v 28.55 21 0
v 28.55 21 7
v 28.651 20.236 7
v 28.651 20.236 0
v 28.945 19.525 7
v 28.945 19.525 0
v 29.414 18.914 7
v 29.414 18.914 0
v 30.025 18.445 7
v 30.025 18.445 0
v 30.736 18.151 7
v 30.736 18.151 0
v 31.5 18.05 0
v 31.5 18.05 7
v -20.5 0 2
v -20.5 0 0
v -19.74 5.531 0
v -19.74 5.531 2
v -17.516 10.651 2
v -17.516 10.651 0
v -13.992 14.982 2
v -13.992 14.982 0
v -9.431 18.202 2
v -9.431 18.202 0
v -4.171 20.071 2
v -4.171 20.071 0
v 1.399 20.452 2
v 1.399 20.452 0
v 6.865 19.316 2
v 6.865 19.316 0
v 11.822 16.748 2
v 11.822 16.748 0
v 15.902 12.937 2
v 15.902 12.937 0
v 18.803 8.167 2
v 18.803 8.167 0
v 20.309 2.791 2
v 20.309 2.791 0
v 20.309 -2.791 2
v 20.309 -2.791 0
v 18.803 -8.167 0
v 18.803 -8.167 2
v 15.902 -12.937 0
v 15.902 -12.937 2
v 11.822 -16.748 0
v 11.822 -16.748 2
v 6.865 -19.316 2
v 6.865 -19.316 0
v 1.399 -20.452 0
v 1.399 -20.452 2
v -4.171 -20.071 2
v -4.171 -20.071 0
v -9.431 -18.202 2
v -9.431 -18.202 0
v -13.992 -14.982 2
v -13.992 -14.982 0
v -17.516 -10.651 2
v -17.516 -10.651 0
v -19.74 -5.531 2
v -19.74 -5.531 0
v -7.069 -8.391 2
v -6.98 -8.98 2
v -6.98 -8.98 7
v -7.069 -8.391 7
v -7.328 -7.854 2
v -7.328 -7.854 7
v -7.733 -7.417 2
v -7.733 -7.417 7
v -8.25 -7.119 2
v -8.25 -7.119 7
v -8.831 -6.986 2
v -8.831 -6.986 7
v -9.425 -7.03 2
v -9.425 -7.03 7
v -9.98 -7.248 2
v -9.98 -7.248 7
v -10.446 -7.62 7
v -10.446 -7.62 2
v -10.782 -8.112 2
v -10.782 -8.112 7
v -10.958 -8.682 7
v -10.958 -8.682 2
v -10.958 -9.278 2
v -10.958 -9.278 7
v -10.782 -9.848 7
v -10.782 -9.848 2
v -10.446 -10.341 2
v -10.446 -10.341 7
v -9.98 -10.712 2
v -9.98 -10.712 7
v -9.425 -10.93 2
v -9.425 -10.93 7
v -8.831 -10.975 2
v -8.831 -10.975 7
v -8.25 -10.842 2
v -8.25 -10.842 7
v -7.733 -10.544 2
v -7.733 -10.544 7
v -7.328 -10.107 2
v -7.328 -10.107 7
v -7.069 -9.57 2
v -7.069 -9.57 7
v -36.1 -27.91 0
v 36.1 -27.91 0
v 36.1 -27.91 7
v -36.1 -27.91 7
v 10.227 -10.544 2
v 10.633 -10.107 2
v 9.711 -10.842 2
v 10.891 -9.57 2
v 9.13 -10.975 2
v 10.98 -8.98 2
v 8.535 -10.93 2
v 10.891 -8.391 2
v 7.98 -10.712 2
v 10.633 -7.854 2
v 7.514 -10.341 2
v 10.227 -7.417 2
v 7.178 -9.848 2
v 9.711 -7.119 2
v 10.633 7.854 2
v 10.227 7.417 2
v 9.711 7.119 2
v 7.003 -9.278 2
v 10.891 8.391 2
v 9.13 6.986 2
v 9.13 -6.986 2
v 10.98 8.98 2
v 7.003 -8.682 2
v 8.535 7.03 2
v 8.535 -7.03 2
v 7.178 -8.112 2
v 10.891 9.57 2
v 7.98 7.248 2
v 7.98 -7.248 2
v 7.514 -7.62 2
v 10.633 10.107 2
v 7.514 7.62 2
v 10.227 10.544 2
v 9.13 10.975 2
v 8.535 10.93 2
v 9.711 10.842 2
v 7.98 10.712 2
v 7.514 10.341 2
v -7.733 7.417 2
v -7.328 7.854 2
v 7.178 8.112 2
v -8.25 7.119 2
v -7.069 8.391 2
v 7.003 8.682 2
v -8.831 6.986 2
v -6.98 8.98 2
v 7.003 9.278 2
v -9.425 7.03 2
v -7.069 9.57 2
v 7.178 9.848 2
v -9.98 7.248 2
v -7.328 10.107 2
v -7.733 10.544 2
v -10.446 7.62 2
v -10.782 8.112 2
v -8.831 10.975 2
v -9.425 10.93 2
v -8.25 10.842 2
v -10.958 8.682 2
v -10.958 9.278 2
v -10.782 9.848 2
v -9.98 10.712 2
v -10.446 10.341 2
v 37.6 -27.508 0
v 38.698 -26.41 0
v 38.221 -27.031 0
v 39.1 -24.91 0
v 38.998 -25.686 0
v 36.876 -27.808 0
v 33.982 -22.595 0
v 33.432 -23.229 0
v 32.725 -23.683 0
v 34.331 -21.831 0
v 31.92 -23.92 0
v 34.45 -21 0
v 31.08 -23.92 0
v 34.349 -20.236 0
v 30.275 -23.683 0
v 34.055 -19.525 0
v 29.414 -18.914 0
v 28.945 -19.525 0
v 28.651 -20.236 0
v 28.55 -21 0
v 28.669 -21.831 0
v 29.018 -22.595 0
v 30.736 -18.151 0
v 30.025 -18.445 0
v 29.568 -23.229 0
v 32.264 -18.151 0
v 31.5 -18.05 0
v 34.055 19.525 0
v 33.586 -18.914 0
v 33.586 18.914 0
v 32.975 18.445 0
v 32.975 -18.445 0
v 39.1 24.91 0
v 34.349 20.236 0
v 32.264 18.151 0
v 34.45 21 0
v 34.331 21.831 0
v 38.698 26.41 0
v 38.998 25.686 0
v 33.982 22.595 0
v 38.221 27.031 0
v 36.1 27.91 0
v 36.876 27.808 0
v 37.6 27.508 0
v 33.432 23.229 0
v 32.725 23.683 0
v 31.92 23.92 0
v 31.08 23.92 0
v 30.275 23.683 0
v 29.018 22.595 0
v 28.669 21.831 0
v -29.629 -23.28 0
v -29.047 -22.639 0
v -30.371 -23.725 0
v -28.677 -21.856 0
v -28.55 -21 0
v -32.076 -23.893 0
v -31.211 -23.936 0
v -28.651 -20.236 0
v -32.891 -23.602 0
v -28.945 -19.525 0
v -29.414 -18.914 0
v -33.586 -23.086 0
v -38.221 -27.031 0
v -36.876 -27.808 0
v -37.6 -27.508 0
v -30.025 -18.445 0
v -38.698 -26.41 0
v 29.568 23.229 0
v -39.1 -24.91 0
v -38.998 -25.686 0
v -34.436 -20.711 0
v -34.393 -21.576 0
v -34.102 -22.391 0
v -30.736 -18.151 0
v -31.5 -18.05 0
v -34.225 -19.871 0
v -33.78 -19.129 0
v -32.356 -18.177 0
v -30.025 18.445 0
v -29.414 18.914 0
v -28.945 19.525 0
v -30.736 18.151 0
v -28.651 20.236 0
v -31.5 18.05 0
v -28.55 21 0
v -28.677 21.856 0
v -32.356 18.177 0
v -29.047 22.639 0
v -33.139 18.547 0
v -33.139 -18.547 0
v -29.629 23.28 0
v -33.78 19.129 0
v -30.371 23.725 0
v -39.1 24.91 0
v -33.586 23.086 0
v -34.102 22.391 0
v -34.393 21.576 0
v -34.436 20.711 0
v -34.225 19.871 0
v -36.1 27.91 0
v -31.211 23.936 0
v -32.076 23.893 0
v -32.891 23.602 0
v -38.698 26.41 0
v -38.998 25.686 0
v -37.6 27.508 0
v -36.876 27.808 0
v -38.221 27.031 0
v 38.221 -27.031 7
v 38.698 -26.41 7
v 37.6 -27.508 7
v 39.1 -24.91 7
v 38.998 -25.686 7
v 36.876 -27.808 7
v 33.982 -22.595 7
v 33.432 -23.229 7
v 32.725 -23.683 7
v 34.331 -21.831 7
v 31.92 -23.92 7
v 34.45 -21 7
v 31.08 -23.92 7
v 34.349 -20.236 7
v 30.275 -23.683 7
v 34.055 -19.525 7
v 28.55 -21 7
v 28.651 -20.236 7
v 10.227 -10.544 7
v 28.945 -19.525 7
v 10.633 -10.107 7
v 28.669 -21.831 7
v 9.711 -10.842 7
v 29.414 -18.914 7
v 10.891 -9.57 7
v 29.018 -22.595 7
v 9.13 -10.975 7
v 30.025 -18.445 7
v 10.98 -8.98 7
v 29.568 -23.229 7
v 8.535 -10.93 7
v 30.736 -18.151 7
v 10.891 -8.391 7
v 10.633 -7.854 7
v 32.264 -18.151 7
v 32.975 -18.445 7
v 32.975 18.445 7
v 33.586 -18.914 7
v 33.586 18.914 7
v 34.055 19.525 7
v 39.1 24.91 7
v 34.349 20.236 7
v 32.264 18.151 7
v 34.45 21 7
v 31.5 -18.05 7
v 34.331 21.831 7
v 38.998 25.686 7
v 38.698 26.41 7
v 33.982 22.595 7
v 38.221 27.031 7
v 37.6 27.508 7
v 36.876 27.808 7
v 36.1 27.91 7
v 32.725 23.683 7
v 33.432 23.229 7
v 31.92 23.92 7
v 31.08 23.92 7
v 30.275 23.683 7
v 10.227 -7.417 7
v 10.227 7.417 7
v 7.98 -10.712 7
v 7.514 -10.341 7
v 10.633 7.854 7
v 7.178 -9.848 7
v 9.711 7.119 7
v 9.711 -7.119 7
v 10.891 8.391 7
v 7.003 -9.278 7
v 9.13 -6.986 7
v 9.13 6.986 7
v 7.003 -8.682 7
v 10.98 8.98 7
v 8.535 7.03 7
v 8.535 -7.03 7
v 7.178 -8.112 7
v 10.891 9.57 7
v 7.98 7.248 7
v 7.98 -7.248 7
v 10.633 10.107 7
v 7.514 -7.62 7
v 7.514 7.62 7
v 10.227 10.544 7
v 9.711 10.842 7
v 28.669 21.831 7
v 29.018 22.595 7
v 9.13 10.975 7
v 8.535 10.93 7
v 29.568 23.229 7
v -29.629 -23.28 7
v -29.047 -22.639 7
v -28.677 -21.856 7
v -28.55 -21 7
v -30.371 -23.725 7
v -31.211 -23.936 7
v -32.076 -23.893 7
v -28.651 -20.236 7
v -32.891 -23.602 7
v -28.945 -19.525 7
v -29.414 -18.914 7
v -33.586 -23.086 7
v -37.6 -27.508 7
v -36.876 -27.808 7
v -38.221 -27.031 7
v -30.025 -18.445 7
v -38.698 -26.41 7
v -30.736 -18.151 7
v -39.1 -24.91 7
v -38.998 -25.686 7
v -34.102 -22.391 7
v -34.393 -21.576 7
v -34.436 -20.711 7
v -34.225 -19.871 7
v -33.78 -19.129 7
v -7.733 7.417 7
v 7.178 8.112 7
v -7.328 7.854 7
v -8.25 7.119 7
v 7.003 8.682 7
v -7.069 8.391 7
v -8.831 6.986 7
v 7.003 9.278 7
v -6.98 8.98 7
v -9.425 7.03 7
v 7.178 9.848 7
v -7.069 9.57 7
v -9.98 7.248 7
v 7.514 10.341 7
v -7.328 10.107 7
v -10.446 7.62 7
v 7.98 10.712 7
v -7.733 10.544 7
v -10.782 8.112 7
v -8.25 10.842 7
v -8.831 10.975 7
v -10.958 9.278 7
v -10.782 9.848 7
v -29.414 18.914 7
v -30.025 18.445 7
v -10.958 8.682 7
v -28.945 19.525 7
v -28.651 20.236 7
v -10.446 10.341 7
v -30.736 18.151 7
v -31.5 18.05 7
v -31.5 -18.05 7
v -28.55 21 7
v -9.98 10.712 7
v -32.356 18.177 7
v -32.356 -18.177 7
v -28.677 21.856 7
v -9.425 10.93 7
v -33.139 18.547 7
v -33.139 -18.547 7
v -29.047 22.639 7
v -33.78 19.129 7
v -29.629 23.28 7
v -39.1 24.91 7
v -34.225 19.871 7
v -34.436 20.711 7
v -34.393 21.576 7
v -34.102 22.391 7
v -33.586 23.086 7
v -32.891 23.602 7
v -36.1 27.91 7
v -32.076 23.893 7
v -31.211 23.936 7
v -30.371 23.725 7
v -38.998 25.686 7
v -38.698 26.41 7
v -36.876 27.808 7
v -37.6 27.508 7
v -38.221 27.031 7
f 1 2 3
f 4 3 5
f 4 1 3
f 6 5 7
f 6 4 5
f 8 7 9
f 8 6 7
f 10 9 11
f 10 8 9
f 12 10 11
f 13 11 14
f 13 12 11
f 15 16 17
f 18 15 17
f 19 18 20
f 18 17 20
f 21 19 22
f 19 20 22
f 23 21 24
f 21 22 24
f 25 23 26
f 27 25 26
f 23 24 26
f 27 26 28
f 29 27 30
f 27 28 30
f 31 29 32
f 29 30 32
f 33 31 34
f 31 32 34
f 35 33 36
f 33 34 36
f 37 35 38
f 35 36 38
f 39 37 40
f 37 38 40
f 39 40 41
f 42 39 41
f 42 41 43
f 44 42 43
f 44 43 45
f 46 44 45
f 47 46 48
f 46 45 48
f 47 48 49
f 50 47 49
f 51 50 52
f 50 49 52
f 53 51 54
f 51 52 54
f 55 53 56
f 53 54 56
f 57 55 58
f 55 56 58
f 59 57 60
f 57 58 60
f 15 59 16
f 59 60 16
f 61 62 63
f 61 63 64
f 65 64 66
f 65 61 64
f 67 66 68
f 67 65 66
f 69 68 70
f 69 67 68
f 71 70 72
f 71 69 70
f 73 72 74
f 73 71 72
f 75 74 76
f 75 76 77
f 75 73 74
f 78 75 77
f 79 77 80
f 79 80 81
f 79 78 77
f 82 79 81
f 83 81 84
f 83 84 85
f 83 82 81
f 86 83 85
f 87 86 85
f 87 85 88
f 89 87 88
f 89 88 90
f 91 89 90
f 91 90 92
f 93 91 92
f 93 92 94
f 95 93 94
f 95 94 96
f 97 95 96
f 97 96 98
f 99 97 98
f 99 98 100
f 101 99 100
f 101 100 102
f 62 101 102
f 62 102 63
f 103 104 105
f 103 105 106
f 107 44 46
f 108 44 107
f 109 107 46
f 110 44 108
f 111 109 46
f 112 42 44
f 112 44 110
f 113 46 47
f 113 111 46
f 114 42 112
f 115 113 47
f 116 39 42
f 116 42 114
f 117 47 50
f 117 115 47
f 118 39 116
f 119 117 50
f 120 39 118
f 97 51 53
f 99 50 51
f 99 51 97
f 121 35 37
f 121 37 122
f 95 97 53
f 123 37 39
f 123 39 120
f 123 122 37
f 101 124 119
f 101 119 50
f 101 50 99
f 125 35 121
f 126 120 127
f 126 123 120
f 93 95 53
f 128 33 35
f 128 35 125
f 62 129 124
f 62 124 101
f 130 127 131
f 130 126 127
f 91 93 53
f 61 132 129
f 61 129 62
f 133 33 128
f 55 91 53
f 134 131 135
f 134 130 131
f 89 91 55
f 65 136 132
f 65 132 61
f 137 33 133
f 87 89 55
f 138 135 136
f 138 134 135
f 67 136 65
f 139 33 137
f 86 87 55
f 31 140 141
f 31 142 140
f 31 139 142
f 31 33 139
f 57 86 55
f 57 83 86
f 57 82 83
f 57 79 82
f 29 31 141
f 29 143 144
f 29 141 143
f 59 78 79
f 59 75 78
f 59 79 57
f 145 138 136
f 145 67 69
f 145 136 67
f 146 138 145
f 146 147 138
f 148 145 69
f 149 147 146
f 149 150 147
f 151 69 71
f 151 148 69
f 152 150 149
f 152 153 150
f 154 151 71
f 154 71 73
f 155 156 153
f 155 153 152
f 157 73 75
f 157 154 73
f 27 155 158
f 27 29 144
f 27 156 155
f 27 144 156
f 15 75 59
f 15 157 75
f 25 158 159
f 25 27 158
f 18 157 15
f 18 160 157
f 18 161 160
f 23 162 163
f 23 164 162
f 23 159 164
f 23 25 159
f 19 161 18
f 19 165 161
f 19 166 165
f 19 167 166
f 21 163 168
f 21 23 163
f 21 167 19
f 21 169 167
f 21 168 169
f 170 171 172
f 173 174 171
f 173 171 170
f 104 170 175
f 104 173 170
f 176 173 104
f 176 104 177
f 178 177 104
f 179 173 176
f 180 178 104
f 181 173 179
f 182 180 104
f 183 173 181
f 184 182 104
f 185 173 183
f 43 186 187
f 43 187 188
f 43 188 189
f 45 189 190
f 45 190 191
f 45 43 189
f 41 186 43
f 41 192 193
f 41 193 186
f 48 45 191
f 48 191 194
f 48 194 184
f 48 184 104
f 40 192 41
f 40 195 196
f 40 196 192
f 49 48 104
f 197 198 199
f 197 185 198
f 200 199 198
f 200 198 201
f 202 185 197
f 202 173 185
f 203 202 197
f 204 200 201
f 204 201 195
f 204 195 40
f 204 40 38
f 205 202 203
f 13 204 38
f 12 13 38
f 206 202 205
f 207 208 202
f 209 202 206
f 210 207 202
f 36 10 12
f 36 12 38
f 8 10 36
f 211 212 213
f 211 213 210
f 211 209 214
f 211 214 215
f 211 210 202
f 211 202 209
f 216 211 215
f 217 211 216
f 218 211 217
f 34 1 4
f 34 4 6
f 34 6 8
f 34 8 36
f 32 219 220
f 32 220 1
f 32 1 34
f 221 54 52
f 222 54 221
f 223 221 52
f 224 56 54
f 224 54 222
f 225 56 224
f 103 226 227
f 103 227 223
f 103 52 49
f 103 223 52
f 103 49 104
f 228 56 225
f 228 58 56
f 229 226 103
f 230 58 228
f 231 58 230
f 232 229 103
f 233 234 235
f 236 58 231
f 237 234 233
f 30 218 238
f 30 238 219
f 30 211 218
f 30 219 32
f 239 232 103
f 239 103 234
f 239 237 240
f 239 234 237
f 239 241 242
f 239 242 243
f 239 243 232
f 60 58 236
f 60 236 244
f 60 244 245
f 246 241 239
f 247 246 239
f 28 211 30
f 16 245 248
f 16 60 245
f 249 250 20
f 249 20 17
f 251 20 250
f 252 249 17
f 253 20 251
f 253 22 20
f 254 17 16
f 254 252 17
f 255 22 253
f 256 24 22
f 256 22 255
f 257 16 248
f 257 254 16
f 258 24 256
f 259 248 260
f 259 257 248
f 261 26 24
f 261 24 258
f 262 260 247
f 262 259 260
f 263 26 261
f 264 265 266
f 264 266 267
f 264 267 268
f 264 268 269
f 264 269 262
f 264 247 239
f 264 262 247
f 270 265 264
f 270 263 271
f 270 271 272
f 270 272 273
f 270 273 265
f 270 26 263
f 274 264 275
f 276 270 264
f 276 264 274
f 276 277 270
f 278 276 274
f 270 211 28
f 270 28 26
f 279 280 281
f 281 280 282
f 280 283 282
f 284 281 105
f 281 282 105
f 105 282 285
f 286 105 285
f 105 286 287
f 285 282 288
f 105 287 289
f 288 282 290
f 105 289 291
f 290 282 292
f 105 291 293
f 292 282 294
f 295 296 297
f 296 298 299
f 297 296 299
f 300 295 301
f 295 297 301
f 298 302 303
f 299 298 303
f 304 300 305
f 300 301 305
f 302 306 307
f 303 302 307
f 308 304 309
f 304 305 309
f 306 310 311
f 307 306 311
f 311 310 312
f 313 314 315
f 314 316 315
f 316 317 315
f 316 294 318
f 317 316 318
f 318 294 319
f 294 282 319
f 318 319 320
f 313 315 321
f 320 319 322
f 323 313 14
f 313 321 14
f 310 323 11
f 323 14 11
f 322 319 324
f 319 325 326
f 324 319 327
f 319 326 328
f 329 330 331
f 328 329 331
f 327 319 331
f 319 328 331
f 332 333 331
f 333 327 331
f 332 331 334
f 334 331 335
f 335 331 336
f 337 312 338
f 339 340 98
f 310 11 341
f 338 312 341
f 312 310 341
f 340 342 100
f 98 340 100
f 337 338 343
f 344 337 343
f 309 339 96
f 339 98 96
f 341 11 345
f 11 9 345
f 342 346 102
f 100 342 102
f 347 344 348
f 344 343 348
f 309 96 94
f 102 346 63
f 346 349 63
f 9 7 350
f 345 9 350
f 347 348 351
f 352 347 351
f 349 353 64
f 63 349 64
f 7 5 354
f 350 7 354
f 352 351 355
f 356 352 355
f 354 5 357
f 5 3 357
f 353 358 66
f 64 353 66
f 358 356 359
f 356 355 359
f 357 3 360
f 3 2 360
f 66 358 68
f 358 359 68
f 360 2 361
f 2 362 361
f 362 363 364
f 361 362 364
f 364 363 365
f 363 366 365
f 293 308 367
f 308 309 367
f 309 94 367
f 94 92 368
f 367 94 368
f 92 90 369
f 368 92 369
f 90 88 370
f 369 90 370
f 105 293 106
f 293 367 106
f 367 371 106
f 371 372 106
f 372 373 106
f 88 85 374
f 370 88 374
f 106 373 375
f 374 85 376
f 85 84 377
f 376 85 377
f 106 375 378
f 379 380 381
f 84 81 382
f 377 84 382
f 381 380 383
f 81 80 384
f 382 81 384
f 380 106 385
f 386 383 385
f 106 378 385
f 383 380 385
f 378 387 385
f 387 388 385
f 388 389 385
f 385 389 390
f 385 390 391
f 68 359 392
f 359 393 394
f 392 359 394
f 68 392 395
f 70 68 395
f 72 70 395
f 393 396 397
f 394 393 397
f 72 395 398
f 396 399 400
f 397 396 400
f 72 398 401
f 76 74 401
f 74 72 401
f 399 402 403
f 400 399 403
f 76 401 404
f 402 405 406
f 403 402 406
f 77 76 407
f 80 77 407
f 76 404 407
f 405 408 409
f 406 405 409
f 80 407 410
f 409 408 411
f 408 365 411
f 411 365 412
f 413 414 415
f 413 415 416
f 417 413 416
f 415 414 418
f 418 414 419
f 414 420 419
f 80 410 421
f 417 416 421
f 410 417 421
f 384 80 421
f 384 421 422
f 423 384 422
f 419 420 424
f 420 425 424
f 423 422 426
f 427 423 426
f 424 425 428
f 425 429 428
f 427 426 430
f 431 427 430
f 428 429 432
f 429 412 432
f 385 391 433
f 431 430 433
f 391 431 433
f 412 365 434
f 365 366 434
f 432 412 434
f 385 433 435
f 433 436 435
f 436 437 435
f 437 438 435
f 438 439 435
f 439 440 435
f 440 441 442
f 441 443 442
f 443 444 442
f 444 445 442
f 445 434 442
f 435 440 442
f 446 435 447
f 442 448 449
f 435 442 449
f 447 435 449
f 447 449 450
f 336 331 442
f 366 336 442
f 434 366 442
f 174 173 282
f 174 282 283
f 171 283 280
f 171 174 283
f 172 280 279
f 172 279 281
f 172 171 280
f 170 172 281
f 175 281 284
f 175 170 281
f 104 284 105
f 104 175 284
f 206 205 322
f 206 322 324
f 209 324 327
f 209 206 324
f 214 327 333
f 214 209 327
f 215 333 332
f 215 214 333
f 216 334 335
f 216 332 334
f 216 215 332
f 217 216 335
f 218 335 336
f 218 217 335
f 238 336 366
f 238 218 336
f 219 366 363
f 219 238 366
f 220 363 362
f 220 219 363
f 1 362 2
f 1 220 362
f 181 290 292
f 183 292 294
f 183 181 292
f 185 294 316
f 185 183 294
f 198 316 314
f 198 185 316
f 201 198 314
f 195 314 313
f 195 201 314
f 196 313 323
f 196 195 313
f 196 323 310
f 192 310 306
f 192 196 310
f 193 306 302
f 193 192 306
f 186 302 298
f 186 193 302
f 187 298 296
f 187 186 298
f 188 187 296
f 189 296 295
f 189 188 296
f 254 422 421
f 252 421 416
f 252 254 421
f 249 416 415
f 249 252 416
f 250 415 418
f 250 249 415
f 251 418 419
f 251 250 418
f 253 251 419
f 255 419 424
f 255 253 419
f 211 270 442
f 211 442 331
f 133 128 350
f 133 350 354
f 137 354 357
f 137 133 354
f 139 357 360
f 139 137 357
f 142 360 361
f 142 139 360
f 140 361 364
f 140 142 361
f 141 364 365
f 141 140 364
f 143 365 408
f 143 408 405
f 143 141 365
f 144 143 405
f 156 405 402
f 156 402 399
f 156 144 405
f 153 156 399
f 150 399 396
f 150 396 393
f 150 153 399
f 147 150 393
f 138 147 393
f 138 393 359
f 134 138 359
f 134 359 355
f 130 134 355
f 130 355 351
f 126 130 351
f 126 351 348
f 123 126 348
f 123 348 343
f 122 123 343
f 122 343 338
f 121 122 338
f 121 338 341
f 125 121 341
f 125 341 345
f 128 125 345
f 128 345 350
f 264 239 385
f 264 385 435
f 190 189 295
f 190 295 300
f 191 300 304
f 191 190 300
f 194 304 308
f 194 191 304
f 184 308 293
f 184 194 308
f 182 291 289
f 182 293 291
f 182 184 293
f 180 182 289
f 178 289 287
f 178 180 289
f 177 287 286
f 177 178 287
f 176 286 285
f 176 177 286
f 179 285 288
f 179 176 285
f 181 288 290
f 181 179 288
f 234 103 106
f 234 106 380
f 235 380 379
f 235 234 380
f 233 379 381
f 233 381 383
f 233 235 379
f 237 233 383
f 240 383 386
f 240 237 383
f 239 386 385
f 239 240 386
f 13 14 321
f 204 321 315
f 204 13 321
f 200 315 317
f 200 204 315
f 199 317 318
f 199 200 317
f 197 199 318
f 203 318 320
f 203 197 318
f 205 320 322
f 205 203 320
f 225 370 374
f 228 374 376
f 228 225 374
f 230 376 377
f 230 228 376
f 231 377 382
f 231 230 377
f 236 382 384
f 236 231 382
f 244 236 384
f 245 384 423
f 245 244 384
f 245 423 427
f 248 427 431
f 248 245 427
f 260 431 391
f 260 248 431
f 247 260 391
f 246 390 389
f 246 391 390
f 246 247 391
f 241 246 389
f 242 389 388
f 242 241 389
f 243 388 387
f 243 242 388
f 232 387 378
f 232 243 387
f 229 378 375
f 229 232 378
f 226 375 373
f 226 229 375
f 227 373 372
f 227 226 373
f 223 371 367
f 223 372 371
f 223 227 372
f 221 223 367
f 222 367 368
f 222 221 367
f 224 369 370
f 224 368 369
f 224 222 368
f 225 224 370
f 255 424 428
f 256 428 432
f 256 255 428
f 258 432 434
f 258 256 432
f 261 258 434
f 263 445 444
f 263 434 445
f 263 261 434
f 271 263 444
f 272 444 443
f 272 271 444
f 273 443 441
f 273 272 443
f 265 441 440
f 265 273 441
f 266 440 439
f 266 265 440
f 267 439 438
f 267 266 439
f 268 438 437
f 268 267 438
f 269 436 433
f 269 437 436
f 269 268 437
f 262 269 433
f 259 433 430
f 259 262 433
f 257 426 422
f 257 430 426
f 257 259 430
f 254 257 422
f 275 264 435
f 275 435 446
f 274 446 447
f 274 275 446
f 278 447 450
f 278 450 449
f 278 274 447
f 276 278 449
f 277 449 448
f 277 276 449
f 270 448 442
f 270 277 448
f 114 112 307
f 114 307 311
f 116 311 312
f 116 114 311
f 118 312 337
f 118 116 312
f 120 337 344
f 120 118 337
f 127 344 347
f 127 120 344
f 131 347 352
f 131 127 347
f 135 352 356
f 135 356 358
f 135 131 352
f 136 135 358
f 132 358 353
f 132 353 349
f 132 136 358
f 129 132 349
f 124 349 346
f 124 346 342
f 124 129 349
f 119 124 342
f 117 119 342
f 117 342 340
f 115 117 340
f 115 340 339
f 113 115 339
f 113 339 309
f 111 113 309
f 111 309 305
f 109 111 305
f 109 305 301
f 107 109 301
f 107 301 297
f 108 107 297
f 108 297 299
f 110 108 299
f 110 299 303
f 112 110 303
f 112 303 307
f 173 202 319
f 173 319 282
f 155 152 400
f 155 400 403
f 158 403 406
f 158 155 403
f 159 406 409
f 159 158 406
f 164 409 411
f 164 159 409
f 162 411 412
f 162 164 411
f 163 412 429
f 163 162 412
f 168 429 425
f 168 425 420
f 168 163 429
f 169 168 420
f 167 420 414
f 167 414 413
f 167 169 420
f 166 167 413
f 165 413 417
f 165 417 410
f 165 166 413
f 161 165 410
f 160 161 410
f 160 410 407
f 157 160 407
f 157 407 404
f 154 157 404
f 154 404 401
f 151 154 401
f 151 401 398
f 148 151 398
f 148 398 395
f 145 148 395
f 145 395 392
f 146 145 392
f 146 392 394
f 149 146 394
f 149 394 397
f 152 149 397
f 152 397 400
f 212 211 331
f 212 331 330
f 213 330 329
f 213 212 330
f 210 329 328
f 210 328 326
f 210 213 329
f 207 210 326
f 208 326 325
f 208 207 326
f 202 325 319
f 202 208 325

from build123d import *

# Parameters (mm, degrees)
EXTRUDE_1_DEPTH     = 7
CUT_EXTRUDE_1_DEPTH = 49.546658999
F_4_0MM_2_OUTLINE_R = 2
F_4_0MM_2_DEPTH     = 7
SKETCH_6_R          = 20.5
CUT_EXTRUDE_2_DEPTH = 2


# Read off the part's stored shape, not the designer's step: Ø4.0mm 暗销孔2
with BuildPart() as part:
    # 草图2 → 凸台-拉伸1 (new body)
    with BuildSketch(Plane.XY):
        with BuildLine():
            Line((-36.1, 27.91), (36.1, 27.91))
            ThreePointArc((36.1, 27.91), (38.221320344, 27.031320344), (39.1, 24.91))
            Line((39.1, 24.91), (39.1, -24.91))
            ThreePointArc((39.1, -24.91), (38.221320344, -27.031320344), (36.1, -27.91))
            Line((36.1, -27.91), (-36.1, -27.91))
            ThreePointArc((-36.1, -27.91), (-38.221320344, -27.031320344), (-39.1, -24.91))
            Line((-39.1, -24.91), (-39.1, 24.91))
            ThreePointArc((-39.1, 24.91), (-38.221320344, 27.031320344), (-36.1, 27.91))
        make_face()
    extrude(amount=EXTRUDE_1_DEPTH)

    # 草图1 → 切除-拉伸1 (cut, through all)
    with BuildSketch(Plane.XY):
        with BuildLine():
            Line((-31.5, 18.05), (-31.5, 21))
            Line((-31.5, 21), (-28.55, 21))
            ThreePointArc((-28.55, 21), (-33.585965005, 23.085965005), (-31.5, 18.05))
        make_face()
        with BuildLine():
            Line((-28.55, 21), (-31.5, 21))
            Line((-31.5, 21), (-31.5, 18.05))
            ThreePointArc((-31.5, 18.05), (-29.414034995, 18.914034995), (-28.55, 21))
        make_face()
        with BuildLine():
            ThreePointArc((34.45, 21), (31.5, 23.95), (28.55, 21))
            Line((28.55, 21), (31.5, 21))
            Line((31.5, 21), (31.5, 18.05))
            ThreePointArc((31.5, 18.05), (33.585965005, 18.914034995), (34.45, 21))
        make_face()
        with BuildLine():
            Line((31.5, 21), (28.55, 21))
            ThreePointArc((28.55, 21), (29.414034995, 18.914034995), (31.5, 18.05))
            Line((31.5, 18.05), (31.5, 21))
        make_face()
        with BuildLine():
            ThreePointArc((-28.55, -21), (-29.414034995, -18.914034995), (-31.5, -18.05))
            Line((-31.5, -18.05), (-31.5, -21))
            Line((-31.5, -21), (-28.55, -21))
        make_face()
        with BuildLine():
            Line((-31.5, -21), (-31.5, -18.05))
            ThreePointArc((-31.5, -18.05), (-33.585965005, -23.085965005), (-28.55, -21))
            Line((-28.55, -21), (-31.5, -21))
        make_face()
        with BuildLine():
            ThreePointArc((34.45, -21), (33.585965005, -18.914034995), (31.5, -18.05))
            Line((31.5, -18.05), (31.5, -21))
            Line((31.5, -21), (28.55, -21))
            ThreePointArc((28.55, -21), (31.5, -23.95), (34.45, -21))
        make_face()
        with BuildLine():
            Line((31.5, -21), (31.5, -18.05))
            ThreePointArc((31.5, -18.05), (29.414034995, -18.914034995), (28.55, -21))
            Line((28.55, -21), (31.5, -21))
        make_face()
    extrude(amount=CUT_EXTRUDE_1_DEPTH, mode=Mode.SUBTRACT)

    # Ø4.0mm 暗销孔2 outline → Ø4.0mm 暗销孔2 (cut)
    with BuildSketch(Plane.XY):
        with Locations((8.980256121, -8.980256121)):
            Circle(F_4_0MM_2_OUTLINE_R)
        with Locations((-8.980256121, -8.980256121)):
            Circle(F_4_0MM_2_OUTLINE_R)
        with Locations((-8.980256121, 8.980256121)):
            Circle(F_4_0MM_2_OUTLINE_R)
        with Locations((8.980256121, 8.980256121)):
            Circle(F_4_0MM_2_OUTLINE_R)
    extrude(amount=F_4_0MM_2_DEPTH, mode=Mode.SUBTRACT)

    # 草图6 → 切除-拉伸2 (cut)
    with BuildSketch(Plane(origin=(0, 0, 0), x_dir=(-1, 0, 0), z_dir=(0, 0, -1))):
        Circle(SKETCH_6_R)
    extrude(amount=-CUT_EXTRUDE_2_DEPTH, mode=Mode.SUBTRACT)


solid = part.part
